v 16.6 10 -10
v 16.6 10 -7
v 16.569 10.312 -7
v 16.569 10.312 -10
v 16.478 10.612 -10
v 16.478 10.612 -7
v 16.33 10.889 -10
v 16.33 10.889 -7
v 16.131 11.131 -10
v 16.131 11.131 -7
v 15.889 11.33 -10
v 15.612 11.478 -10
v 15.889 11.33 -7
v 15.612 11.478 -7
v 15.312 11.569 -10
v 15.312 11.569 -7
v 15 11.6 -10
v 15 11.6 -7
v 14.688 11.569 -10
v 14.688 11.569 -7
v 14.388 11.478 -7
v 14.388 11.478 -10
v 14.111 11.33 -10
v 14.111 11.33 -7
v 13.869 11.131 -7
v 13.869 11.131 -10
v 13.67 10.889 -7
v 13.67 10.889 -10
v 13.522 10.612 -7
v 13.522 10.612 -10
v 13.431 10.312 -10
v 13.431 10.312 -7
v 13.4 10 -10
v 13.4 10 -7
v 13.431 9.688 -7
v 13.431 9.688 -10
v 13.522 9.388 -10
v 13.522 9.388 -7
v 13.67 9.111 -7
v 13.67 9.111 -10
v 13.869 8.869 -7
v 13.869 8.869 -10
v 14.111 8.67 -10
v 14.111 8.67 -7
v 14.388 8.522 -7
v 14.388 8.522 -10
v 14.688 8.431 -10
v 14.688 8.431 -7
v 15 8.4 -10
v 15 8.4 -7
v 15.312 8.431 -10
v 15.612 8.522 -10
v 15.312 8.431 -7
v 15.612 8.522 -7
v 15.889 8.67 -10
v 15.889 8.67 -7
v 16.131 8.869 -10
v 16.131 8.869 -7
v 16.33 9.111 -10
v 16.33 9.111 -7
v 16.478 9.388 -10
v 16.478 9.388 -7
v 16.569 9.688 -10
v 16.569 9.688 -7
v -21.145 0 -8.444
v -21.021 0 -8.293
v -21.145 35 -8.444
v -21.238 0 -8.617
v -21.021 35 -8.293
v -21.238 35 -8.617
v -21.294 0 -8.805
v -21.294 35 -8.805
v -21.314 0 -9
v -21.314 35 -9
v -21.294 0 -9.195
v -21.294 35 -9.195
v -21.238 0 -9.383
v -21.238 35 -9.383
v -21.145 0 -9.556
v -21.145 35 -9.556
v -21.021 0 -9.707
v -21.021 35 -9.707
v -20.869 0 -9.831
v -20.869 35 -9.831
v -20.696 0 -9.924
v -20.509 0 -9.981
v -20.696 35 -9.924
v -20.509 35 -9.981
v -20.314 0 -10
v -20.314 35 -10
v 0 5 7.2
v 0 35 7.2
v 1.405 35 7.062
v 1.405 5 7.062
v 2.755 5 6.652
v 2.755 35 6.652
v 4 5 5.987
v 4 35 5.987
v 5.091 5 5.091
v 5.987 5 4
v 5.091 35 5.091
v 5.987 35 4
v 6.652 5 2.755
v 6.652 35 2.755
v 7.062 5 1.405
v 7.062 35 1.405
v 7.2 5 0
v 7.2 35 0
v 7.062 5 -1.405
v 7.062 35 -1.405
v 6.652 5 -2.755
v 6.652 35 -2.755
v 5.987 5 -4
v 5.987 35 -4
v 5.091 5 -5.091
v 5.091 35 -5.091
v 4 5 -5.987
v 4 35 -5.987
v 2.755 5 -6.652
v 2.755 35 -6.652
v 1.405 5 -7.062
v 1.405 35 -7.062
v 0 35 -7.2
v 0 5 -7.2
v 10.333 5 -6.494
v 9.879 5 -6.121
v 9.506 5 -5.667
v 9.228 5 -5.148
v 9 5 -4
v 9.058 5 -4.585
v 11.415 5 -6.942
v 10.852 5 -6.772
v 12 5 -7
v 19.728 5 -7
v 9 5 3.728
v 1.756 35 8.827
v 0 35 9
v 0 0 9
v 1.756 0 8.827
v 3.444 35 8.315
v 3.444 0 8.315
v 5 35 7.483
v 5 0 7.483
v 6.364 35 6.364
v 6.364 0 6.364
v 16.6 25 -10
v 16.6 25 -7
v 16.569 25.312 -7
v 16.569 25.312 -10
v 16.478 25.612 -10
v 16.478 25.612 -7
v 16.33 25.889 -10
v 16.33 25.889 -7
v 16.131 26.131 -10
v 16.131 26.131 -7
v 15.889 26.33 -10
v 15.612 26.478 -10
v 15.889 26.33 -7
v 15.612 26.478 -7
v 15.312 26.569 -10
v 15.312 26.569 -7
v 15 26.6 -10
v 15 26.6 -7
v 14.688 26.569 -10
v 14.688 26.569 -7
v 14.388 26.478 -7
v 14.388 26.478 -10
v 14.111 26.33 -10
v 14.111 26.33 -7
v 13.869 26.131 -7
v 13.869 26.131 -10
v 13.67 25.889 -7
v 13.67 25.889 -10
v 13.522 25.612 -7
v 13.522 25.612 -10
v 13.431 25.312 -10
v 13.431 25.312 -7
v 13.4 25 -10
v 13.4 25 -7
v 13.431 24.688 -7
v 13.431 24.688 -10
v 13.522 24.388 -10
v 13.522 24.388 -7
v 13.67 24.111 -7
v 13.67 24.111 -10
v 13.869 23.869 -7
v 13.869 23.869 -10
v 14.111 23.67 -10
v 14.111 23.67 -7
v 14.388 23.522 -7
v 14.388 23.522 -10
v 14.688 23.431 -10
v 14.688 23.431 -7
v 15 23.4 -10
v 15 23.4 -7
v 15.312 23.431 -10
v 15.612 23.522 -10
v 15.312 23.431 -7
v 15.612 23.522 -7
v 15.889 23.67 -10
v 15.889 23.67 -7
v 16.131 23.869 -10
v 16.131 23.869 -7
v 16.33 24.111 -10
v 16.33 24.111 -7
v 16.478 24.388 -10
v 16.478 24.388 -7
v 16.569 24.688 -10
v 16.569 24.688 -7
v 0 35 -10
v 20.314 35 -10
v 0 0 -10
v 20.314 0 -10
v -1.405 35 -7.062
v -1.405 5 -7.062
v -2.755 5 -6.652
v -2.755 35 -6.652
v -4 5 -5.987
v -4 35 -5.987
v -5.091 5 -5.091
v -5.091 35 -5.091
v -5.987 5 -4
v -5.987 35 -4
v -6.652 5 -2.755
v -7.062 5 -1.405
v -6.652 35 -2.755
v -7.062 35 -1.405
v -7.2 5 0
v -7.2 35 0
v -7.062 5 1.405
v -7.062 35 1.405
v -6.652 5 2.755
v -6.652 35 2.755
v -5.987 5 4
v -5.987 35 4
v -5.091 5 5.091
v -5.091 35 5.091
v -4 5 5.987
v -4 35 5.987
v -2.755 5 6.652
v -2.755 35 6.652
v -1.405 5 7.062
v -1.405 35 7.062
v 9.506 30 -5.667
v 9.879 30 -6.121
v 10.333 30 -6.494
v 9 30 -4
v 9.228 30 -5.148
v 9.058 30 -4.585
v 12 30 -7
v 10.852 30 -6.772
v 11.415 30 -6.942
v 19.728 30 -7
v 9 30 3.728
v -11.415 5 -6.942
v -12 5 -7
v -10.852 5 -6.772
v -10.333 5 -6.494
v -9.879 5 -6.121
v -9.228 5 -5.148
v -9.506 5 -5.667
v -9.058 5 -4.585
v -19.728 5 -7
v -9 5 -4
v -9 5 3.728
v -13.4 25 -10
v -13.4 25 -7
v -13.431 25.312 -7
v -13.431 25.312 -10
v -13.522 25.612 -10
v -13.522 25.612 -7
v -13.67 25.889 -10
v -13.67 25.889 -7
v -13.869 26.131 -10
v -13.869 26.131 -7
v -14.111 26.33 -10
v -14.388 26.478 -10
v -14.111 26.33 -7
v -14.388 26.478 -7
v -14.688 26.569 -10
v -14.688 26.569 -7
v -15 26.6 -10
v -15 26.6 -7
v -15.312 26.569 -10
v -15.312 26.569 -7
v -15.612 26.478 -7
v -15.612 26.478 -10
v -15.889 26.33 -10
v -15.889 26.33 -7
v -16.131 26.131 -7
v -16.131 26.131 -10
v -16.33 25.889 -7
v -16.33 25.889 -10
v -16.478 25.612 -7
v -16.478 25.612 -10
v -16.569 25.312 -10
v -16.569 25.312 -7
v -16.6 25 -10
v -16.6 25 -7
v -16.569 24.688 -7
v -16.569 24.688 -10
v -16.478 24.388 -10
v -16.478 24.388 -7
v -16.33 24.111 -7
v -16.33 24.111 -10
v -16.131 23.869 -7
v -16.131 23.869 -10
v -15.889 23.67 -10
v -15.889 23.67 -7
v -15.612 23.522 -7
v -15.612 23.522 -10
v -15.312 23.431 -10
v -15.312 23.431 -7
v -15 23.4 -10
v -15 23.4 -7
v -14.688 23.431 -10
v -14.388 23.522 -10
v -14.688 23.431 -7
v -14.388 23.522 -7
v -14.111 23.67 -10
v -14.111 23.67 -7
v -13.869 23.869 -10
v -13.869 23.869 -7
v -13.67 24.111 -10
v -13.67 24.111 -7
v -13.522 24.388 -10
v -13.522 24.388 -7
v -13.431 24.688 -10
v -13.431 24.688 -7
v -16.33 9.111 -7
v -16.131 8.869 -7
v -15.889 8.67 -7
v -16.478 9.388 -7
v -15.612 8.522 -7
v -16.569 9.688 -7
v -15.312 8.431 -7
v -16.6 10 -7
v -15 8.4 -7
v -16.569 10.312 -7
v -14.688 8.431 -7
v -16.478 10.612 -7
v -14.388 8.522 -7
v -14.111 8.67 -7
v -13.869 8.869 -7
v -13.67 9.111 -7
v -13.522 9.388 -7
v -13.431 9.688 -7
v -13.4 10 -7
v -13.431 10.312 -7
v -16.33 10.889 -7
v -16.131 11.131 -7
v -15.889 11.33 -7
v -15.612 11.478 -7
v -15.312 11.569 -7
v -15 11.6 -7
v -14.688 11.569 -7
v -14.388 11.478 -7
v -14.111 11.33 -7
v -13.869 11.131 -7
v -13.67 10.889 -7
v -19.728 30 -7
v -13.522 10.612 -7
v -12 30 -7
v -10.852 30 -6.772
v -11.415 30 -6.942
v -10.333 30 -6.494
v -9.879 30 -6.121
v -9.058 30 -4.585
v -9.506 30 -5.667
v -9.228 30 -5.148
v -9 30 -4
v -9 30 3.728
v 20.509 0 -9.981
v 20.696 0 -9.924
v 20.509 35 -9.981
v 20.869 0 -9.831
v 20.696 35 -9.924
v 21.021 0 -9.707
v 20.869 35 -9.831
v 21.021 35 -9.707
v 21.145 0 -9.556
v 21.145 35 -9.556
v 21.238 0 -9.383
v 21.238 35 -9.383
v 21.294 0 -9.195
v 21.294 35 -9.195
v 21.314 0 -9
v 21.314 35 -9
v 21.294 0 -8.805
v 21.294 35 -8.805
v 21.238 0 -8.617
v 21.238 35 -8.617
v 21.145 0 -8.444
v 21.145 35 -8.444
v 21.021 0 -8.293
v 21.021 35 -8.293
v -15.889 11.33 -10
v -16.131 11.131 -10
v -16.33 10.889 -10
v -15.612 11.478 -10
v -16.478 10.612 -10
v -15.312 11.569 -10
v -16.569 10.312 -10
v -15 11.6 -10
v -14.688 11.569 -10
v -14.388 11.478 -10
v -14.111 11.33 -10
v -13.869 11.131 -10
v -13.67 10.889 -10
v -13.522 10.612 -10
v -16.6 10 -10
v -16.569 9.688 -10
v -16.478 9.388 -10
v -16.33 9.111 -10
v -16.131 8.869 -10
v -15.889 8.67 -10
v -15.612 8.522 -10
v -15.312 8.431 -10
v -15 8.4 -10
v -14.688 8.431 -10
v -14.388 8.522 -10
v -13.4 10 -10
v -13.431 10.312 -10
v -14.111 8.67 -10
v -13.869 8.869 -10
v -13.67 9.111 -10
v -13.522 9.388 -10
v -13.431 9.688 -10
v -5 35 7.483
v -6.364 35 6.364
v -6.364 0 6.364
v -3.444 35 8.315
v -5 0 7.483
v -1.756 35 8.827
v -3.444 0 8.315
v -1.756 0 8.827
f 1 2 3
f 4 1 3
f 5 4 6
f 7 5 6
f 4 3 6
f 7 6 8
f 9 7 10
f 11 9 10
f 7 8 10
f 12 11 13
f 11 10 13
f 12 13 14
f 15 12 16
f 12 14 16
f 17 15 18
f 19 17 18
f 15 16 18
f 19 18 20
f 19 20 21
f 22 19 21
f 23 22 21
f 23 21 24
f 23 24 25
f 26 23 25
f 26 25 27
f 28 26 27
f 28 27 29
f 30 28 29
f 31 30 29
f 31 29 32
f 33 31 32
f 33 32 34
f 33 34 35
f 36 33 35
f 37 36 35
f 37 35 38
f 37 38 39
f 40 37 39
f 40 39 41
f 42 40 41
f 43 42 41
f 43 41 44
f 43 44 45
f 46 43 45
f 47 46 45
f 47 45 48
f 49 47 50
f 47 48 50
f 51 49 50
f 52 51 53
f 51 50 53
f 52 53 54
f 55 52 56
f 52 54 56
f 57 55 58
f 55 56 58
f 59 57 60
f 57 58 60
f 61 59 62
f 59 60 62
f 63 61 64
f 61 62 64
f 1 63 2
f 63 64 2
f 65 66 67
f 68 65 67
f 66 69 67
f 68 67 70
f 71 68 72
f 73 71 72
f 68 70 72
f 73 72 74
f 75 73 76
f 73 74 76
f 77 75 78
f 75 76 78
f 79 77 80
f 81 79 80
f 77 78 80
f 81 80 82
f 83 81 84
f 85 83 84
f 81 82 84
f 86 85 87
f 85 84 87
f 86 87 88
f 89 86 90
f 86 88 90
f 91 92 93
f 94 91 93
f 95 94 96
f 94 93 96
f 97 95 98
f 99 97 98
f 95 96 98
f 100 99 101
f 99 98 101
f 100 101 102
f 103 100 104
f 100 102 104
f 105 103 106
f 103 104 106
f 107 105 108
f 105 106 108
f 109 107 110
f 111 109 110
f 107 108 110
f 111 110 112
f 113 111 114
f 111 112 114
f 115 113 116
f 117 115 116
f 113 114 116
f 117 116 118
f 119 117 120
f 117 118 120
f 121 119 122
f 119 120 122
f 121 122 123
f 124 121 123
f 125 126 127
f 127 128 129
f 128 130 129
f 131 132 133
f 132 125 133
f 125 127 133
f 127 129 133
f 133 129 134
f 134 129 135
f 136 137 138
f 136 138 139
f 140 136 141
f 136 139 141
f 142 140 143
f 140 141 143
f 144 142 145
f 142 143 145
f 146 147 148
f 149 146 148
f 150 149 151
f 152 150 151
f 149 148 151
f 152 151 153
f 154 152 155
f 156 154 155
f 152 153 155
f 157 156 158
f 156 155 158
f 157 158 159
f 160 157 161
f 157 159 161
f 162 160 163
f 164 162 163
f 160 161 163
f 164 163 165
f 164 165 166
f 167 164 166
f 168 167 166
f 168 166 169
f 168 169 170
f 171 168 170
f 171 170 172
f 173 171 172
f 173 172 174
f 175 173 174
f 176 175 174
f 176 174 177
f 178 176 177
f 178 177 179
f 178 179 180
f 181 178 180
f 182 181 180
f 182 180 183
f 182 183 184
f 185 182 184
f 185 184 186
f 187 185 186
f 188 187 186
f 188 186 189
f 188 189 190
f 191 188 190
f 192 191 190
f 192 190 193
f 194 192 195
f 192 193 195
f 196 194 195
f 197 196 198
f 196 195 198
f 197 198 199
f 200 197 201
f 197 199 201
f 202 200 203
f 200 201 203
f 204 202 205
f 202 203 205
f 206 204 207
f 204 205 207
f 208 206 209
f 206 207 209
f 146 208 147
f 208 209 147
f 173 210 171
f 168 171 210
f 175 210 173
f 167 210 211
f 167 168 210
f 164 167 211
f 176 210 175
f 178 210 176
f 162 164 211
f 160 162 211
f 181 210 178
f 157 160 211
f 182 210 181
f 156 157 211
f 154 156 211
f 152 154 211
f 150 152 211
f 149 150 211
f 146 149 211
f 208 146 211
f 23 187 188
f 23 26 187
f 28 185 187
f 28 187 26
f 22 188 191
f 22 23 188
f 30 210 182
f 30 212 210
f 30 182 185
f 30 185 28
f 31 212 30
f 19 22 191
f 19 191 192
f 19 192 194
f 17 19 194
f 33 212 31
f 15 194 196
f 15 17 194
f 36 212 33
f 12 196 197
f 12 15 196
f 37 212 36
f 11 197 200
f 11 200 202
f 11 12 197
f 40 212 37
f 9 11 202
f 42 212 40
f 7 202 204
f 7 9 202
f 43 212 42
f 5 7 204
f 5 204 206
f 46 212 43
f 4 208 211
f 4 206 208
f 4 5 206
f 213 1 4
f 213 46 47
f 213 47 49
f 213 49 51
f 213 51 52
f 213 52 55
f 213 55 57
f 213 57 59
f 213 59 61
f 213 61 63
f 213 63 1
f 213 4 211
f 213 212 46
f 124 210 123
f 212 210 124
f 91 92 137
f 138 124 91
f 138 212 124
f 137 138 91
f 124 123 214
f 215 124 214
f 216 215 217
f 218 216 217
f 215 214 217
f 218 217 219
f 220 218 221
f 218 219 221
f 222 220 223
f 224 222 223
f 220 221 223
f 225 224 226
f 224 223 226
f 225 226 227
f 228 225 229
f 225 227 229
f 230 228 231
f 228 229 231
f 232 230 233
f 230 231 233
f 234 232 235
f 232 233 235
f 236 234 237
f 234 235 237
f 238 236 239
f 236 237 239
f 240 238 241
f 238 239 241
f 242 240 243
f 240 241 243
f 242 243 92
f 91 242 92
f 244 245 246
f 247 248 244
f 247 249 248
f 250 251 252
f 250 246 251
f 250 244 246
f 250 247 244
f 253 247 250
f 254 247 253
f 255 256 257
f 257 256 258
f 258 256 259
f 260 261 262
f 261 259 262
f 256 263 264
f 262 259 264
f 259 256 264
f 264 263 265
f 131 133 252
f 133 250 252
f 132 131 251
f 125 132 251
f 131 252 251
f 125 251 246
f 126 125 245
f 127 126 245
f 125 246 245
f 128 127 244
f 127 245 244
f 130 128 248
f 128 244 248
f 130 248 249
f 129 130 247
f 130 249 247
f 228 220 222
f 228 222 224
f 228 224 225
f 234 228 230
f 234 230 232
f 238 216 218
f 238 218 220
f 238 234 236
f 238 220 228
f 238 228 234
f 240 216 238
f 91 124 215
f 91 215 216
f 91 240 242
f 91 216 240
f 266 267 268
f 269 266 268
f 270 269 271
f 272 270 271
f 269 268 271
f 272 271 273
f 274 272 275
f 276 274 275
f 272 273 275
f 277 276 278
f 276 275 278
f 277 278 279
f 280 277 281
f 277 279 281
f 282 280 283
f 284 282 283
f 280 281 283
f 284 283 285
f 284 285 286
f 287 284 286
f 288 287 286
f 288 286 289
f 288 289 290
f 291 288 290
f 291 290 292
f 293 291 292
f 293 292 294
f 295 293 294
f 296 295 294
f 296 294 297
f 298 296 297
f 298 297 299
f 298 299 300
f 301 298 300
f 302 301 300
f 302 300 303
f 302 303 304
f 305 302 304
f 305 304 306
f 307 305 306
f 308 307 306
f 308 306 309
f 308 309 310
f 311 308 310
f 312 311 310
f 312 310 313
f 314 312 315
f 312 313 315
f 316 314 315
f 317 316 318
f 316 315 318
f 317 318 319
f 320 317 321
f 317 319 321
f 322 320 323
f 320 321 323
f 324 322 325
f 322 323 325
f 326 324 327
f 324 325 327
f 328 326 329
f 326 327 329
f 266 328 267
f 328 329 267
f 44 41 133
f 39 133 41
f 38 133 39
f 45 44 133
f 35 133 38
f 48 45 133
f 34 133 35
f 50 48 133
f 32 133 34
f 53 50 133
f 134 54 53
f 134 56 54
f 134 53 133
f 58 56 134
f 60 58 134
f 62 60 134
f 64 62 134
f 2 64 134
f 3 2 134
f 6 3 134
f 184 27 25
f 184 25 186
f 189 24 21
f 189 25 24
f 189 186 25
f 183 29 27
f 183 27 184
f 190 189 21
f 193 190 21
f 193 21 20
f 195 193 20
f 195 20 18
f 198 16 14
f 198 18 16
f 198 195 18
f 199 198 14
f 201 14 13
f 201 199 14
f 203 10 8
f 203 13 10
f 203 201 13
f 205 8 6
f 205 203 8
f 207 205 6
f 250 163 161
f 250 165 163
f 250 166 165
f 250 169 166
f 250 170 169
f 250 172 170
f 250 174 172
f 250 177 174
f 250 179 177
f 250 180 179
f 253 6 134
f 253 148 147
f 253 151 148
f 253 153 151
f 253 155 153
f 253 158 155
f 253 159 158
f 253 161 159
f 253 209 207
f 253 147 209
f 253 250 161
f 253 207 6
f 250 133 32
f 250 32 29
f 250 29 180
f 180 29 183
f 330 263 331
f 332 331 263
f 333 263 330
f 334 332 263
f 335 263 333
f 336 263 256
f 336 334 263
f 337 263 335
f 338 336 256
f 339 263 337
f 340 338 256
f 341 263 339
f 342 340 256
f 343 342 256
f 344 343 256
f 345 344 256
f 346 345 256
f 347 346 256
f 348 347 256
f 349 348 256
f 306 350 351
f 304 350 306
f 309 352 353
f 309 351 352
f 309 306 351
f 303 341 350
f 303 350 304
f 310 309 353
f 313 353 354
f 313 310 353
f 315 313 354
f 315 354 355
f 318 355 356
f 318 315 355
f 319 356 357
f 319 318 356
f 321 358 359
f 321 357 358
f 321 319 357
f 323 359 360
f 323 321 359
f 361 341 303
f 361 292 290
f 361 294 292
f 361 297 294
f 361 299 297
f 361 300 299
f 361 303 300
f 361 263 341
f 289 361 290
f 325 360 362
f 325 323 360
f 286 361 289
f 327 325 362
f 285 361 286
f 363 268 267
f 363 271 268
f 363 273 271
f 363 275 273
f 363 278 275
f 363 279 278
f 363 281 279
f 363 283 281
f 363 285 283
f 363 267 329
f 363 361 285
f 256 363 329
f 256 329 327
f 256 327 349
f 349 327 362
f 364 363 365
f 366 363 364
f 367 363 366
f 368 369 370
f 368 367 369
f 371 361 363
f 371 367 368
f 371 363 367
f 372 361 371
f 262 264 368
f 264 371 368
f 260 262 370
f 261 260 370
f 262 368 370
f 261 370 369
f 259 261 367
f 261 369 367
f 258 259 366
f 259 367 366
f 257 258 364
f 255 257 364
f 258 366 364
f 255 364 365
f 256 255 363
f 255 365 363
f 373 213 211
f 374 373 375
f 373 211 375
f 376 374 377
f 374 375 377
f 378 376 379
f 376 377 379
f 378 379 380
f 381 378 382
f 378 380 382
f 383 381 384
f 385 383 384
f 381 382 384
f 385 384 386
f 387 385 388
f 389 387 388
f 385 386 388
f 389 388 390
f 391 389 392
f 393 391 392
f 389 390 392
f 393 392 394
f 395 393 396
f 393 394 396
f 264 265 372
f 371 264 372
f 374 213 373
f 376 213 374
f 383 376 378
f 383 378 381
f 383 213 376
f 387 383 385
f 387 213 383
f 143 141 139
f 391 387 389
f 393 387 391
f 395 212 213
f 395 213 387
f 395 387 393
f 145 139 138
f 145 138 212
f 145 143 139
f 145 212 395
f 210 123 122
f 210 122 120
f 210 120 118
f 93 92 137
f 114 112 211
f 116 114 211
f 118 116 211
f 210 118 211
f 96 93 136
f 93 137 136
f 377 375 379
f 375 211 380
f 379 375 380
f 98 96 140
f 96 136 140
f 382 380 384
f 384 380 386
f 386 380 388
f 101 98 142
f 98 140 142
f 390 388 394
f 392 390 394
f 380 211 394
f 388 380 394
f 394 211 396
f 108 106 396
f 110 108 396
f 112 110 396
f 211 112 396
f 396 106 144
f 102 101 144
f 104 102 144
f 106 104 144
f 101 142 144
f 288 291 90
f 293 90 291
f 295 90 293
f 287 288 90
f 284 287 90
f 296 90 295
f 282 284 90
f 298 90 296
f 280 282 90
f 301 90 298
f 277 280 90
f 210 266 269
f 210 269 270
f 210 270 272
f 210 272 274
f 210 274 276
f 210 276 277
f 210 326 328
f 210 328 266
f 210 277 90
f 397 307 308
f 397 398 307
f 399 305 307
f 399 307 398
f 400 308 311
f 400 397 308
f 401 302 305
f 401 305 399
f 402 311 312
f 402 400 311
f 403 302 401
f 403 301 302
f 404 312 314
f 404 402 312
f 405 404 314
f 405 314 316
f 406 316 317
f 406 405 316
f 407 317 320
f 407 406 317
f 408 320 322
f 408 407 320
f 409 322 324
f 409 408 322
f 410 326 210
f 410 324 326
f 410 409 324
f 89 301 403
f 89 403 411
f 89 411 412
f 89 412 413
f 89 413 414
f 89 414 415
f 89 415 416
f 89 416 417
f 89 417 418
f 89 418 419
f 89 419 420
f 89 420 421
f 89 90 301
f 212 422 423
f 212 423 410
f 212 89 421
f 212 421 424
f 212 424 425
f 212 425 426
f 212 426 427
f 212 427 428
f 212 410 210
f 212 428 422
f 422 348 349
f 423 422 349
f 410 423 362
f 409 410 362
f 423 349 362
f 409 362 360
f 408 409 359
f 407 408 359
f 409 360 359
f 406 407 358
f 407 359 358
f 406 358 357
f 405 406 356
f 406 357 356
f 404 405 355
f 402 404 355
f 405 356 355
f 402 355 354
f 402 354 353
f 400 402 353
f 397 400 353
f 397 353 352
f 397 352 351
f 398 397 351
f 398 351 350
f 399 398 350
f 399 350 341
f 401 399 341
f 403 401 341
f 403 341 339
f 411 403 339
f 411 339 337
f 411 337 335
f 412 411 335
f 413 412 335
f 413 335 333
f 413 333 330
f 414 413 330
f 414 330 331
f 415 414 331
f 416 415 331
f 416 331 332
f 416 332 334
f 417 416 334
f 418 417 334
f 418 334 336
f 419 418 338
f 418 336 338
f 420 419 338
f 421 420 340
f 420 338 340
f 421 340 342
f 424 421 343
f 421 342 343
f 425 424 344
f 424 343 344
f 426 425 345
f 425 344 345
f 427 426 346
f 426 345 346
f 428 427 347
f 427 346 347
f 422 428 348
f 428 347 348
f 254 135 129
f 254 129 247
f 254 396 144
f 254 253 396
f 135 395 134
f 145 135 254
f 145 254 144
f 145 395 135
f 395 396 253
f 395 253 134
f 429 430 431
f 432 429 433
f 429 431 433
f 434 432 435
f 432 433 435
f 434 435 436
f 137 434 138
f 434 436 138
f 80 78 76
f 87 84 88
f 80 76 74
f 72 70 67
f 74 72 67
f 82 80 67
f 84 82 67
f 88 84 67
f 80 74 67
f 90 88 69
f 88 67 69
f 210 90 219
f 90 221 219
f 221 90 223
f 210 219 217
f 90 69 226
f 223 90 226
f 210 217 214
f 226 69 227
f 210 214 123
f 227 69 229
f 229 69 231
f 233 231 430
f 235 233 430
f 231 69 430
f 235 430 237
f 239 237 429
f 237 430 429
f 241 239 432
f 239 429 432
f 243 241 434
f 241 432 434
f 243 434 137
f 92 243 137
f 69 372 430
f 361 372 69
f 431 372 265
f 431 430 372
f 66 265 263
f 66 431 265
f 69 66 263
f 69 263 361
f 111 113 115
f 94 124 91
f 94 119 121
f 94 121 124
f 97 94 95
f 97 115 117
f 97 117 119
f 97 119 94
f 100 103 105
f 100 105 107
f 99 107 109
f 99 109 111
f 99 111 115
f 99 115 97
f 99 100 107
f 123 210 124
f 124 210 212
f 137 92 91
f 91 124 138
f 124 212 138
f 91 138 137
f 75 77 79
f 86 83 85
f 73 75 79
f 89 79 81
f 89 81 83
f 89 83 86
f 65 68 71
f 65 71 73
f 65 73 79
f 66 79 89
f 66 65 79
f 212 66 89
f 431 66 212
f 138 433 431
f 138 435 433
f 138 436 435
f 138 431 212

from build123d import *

# Parameters (mm, degrees)
SKETCH_1_R          = 9
EXTRUDE_1_DEPTH     = 35
SKETCH_2_R          = 7.2
CUT_EXTRUDE_1_DEPTH = 30
SKETCH_3_R          = 7.2
EXTRUDE_2_DEPTH     = 35
SKETCH_4_W          = 13.727922061
SKETCH_4_H          = 25
CUT_EXTRUDE_2_DEPTH = 16
FILLET_1_R          = 3
SKETCH_5_R          = 1.6
CUT_EXTRUDE_3_DEPTH = 45.694053757
FILLET_4_R          = 1


with BuildPart() as part:
    # 草图1 → 凸台-拉伸1 (new body)
    with BuildSketch(Plane(origin=(0, 0, 0), x_dir=(1, 0, 0), z_dir=(0, 1, 0))):
        with Locations(Location((0, 0, 0), (0, 0, 270))):
            Circle(SKETCH_1_R)
    extrude(amount=EXTRUDE_1_DEPTH)

    # 草图2 → 切除-拉伸1 (cut)
    with BuildSketch(Plane(origin=(0, 35, 0), x_dir=(1, 0, 0), z_dir=(0, 1, 0))):
        with Locations(Location((0, 0, 0), (0, 0, 270))):
            Circle(SKETCH_2_R)
    extrude(amount=-CUT_EXTRUDE_1_DEPTH, mode=Mode.SUBTRACT)

    # 草图3 → 凸台-拉伸2 (add)
    with BuildSketch(Plane.XZ):
        with BuildLine():
            Line((-6.363961031, 6.363961031), (-22.727922061, -10))
            Line((-22.727922061, -10), (22.727922061, -10))
            Line((22.727922061, -10), (6.363961031, 6.363961031))
            ThreePointArc((6.363961031, 6.363961031), (0, 9), (-6.363961031, 6.363961031))
        make_face()
        with Locations(Location((0, 0, 0), (0, 0, 90))):
            Circle(SKETCH_3_R, mode=Mode.SUBTRACT)
    extrude(amount=-EXTRUDE_2_DEPTH)

    # 草图4 → 切除-拉伸2 (cut)
    with BuildSketch(Plane.XY.offset(9)):
        with Locations((15.863961031, 17.5)):
            Rectangle(SKETCH_4_W, SKETCH_4_H)
        with Locations((-15.863961031, 17.5)):
            Rectangle(SKETCH_4_W, SKETCH_4_H)
    extrude(amount=-CUT_EXTRUDE_2_DEPTH, mode=Mode.SUBTRACT)

    # 圆角1
    fillet_1_edges = [part.edges().sort_by_distance(p)[0] for p in [
        (9, 17.5, -7),
        (-9, 17.5, -7),
    ]]
    fillet(fillet_1_edges, radius=FILLET_1_R)

    # 草图5 → 切除-拉伸3 (cut, through all)
    with BuildSketch(Plane.XY.offset(-7)):
        with Locations((-15, 25)):
            Circle(SKETCH_5_R)
        with Locations((-15, 10)):
            Circle(SKETCH_5_R)
        with Locations((15, 10)):
            Circle(SKETCH_5_R)
        with Locations((15, 25)):
            Circle(SKETCH_5_R)
    extrude(amount=-CUT_EXTRUDE_3_DEPTH, mode=Mode.SUBTRACT)

    # 圆角4
    fillet_4_edges = [part.edges().sort_by_distance(p)[0] for p in [
        (22.727922061, 17.5, -10),
        (-22.727922061, 17.5, -10),
    ]]
    fillet(fillet_4_edges, radius=FILLET_4_R)


with BuildPart() as body_2:
    # Split Bodies 1: the piece on the far side of the plane
    add(part.part)
    split(bisect_by=Plane(origin=(0, 0, 0), x_dir=(0, 0, 1), z_dir=(1, 0, 0)), keep=Keep.BOTTOM)


with BuildPart() as part_1:
    add(part.part)

    # Split Bodies 1
    split(bisect_by=Plane(origin=(0, 0, 0), x_dir=(0, 0, 1), z_dir=(1, 0, 0)), keep=Keep.TOP)


solid = Compound([body_2.part, part_1.part])
